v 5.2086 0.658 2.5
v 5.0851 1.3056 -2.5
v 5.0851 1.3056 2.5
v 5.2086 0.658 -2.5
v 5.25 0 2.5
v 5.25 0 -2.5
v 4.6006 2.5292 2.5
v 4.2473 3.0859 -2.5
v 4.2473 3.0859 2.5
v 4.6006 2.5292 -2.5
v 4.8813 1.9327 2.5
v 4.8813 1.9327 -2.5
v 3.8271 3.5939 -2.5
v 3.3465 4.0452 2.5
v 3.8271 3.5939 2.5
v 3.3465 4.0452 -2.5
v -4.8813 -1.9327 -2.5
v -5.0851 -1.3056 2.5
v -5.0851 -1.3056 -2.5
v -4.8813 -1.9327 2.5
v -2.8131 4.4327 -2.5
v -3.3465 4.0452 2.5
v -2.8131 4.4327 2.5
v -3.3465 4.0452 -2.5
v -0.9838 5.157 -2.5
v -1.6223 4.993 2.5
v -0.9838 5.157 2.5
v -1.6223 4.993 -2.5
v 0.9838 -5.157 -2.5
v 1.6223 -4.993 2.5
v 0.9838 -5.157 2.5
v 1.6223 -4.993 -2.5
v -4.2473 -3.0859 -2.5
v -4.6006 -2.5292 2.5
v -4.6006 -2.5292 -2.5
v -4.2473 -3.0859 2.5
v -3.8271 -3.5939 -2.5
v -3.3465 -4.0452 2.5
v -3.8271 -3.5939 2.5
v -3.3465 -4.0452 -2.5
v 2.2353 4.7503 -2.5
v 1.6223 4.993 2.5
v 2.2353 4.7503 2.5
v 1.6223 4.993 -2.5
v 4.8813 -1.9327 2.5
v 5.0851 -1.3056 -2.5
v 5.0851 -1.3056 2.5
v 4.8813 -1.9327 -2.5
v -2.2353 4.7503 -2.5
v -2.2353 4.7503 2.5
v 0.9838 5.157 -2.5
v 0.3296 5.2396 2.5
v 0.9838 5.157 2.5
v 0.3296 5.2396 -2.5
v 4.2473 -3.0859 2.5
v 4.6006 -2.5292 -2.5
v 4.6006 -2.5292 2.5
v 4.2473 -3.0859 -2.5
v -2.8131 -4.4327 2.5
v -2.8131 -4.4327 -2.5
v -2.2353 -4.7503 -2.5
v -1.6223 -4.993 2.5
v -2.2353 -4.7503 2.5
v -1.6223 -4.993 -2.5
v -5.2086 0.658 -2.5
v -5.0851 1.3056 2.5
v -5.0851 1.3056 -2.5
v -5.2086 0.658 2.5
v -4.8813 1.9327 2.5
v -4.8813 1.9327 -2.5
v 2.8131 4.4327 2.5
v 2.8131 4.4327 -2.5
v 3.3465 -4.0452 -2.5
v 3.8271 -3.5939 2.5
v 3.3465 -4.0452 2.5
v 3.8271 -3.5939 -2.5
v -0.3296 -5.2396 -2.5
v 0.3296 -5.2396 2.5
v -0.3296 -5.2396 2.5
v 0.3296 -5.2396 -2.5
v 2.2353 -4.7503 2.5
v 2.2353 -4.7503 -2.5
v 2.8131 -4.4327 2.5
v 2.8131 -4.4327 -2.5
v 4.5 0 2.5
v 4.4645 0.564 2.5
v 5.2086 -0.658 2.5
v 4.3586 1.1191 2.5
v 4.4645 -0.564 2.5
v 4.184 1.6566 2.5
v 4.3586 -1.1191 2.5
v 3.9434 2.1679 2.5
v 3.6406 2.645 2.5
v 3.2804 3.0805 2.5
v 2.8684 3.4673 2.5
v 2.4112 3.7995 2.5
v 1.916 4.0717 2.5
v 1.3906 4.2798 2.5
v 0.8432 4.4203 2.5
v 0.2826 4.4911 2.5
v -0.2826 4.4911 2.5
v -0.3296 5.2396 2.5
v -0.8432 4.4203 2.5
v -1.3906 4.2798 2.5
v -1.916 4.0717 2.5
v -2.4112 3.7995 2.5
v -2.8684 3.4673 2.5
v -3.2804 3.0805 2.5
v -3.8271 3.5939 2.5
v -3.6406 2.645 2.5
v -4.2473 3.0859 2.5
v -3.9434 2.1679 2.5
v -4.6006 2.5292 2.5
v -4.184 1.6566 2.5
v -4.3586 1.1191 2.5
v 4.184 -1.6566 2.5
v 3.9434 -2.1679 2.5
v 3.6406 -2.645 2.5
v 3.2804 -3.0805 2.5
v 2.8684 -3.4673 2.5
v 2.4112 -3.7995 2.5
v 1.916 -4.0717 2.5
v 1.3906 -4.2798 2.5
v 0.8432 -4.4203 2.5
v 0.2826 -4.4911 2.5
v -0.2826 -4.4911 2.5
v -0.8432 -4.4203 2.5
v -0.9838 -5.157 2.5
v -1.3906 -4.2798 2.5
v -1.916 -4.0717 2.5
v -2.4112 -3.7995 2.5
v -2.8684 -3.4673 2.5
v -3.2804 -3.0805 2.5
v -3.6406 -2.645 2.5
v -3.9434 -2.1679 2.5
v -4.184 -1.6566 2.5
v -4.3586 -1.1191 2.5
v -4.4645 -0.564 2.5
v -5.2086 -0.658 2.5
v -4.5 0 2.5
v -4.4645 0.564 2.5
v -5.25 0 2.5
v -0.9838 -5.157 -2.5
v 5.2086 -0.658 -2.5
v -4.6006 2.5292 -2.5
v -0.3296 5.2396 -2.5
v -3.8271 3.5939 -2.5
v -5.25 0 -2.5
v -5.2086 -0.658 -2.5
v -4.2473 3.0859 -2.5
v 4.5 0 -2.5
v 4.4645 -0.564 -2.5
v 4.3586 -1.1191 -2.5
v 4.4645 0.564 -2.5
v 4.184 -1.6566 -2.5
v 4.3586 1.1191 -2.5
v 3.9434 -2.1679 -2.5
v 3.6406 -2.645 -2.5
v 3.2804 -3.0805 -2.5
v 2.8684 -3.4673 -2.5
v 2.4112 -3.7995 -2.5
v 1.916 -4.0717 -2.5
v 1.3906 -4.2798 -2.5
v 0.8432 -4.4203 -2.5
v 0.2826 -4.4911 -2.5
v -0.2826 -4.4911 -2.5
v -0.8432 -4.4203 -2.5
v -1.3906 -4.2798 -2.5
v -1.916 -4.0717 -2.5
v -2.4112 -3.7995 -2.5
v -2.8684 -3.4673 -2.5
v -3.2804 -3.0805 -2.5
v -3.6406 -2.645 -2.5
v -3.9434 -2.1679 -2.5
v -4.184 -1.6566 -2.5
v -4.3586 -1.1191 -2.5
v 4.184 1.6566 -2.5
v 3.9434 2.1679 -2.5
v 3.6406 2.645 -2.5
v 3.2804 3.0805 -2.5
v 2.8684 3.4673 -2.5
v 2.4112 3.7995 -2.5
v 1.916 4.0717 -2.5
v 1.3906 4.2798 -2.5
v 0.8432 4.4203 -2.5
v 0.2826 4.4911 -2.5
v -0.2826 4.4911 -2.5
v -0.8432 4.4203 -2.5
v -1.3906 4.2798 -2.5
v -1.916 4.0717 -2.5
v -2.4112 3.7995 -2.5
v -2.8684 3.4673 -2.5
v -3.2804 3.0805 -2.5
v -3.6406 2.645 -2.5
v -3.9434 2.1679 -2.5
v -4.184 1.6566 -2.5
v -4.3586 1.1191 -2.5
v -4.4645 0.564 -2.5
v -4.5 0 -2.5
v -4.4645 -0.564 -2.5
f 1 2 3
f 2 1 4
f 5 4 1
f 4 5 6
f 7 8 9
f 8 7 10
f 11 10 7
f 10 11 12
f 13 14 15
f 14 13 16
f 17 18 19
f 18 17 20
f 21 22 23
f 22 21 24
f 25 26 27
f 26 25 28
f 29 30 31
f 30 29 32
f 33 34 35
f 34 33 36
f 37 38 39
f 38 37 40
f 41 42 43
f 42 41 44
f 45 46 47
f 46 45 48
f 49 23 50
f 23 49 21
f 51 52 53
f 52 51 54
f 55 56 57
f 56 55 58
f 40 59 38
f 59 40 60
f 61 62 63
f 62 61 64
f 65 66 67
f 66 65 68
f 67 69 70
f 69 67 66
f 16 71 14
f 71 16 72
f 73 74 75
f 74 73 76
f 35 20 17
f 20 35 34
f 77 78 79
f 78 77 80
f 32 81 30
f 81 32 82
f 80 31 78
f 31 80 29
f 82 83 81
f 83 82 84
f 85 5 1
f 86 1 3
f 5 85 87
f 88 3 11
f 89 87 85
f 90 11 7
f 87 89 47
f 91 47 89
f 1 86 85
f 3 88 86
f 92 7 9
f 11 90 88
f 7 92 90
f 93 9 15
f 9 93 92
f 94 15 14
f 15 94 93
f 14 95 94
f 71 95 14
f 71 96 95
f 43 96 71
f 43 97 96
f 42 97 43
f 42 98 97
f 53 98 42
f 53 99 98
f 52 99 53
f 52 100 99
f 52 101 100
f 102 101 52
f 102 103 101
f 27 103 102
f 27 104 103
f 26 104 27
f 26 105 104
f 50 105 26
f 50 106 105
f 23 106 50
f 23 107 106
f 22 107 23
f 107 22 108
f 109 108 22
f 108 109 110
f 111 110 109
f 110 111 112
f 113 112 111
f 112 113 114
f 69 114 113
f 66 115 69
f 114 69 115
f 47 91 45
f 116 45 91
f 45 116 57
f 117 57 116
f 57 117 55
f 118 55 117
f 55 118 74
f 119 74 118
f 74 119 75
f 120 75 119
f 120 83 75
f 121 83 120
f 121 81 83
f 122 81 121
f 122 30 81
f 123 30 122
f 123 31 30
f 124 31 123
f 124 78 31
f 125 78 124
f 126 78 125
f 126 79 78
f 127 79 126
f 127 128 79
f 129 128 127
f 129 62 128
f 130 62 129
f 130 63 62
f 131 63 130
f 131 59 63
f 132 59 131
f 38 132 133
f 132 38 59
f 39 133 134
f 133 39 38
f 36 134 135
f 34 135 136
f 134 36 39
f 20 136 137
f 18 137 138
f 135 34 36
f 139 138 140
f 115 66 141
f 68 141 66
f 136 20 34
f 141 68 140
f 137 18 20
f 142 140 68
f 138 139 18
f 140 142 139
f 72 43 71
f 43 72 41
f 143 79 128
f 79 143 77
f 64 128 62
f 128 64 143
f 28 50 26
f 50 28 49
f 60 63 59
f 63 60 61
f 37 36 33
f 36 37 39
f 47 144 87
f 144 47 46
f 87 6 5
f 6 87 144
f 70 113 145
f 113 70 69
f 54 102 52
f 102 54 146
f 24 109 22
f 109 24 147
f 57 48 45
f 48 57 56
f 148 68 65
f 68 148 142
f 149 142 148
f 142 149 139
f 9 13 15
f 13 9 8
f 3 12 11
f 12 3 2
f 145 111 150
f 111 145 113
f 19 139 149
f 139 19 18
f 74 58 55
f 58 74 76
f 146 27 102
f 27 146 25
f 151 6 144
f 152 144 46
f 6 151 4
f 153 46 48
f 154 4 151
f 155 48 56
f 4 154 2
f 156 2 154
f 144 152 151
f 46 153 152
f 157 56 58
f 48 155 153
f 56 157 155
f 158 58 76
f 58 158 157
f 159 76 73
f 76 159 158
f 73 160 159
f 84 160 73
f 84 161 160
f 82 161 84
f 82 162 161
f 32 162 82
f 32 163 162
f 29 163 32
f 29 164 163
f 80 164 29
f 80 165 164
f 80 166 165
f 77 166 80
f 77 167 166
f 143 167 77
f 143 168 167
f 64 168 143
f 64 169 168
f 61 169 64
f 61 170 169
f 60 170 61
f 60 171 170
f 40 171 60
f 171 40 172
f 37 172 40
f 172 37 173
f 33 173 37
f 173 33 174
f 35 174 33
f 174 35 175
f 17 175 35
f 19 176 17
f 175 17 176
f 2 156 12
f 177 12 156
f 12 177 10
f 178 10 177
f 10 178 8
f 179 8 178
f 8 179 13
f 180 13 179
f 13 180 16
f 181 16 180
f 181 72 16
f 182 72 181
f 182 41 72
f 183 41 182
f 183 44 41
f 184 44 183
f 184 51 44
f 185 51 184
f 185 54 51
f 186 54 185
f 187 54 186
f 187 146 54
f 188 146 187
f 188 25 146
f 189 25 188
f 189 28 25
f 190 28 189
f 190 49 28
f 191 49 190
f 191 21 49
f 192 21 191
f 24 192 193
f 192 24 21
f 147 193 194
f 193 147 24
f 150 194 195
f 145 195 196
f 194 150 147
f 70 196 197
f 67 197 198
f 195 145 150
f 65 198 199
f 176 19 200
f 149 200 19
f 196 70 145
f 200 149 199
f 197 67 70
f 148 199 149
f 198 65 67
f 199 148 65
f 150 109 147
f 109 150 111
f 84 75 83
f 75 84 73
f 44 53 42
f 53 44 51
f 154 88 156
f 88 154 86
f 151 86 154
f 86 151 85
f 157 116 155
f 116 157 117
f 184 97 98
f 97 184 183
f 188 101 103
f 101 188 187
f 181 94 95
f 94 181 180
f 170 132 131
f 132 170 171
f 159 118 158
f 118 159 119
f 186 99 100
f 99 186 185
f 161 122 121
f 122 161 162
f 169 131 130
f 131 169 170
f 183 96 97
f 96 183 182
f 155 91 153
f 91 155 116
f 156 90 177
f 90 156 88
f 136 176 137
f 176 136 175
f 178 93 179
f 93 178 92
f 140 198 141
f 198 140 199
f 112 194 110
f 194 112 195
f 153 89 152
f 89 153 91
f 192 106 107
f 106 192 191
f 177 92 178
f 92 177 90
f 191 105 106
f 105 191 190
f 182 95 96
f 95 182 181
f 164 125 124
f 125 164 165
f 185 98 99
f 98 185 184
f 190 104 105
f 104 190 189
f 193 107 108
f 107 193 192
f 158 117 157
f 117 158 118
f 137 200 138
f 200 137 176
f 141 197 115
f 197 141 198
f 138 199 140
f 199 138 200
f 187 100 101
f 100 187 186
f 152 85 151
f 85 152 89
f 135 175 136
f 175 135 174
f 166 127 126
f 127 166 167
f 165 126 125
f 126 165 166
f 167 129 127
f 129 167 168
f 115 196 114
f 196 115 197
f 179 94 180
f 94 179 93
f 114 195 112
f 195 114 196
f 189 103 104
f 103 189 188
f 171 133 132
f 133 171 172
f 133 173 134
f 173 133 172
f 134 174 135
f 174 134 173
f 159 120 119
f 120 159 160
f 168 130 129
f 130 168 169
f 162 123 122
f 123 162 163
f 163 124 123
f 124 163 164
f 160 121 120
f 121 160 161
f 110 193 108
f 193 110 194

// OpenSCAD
$fn = 50;


difference() {
	union() {
		translate(v = [0, 0, -2.5000000000]) {
			cylinder(h = 5, r = 5.2500000000);
		}
	}
	union() {
		translate(v = [0, 0, -100.0000000000]) {
			cylinder(h = 200, r = 4.5000000000);
		}
	}
}
